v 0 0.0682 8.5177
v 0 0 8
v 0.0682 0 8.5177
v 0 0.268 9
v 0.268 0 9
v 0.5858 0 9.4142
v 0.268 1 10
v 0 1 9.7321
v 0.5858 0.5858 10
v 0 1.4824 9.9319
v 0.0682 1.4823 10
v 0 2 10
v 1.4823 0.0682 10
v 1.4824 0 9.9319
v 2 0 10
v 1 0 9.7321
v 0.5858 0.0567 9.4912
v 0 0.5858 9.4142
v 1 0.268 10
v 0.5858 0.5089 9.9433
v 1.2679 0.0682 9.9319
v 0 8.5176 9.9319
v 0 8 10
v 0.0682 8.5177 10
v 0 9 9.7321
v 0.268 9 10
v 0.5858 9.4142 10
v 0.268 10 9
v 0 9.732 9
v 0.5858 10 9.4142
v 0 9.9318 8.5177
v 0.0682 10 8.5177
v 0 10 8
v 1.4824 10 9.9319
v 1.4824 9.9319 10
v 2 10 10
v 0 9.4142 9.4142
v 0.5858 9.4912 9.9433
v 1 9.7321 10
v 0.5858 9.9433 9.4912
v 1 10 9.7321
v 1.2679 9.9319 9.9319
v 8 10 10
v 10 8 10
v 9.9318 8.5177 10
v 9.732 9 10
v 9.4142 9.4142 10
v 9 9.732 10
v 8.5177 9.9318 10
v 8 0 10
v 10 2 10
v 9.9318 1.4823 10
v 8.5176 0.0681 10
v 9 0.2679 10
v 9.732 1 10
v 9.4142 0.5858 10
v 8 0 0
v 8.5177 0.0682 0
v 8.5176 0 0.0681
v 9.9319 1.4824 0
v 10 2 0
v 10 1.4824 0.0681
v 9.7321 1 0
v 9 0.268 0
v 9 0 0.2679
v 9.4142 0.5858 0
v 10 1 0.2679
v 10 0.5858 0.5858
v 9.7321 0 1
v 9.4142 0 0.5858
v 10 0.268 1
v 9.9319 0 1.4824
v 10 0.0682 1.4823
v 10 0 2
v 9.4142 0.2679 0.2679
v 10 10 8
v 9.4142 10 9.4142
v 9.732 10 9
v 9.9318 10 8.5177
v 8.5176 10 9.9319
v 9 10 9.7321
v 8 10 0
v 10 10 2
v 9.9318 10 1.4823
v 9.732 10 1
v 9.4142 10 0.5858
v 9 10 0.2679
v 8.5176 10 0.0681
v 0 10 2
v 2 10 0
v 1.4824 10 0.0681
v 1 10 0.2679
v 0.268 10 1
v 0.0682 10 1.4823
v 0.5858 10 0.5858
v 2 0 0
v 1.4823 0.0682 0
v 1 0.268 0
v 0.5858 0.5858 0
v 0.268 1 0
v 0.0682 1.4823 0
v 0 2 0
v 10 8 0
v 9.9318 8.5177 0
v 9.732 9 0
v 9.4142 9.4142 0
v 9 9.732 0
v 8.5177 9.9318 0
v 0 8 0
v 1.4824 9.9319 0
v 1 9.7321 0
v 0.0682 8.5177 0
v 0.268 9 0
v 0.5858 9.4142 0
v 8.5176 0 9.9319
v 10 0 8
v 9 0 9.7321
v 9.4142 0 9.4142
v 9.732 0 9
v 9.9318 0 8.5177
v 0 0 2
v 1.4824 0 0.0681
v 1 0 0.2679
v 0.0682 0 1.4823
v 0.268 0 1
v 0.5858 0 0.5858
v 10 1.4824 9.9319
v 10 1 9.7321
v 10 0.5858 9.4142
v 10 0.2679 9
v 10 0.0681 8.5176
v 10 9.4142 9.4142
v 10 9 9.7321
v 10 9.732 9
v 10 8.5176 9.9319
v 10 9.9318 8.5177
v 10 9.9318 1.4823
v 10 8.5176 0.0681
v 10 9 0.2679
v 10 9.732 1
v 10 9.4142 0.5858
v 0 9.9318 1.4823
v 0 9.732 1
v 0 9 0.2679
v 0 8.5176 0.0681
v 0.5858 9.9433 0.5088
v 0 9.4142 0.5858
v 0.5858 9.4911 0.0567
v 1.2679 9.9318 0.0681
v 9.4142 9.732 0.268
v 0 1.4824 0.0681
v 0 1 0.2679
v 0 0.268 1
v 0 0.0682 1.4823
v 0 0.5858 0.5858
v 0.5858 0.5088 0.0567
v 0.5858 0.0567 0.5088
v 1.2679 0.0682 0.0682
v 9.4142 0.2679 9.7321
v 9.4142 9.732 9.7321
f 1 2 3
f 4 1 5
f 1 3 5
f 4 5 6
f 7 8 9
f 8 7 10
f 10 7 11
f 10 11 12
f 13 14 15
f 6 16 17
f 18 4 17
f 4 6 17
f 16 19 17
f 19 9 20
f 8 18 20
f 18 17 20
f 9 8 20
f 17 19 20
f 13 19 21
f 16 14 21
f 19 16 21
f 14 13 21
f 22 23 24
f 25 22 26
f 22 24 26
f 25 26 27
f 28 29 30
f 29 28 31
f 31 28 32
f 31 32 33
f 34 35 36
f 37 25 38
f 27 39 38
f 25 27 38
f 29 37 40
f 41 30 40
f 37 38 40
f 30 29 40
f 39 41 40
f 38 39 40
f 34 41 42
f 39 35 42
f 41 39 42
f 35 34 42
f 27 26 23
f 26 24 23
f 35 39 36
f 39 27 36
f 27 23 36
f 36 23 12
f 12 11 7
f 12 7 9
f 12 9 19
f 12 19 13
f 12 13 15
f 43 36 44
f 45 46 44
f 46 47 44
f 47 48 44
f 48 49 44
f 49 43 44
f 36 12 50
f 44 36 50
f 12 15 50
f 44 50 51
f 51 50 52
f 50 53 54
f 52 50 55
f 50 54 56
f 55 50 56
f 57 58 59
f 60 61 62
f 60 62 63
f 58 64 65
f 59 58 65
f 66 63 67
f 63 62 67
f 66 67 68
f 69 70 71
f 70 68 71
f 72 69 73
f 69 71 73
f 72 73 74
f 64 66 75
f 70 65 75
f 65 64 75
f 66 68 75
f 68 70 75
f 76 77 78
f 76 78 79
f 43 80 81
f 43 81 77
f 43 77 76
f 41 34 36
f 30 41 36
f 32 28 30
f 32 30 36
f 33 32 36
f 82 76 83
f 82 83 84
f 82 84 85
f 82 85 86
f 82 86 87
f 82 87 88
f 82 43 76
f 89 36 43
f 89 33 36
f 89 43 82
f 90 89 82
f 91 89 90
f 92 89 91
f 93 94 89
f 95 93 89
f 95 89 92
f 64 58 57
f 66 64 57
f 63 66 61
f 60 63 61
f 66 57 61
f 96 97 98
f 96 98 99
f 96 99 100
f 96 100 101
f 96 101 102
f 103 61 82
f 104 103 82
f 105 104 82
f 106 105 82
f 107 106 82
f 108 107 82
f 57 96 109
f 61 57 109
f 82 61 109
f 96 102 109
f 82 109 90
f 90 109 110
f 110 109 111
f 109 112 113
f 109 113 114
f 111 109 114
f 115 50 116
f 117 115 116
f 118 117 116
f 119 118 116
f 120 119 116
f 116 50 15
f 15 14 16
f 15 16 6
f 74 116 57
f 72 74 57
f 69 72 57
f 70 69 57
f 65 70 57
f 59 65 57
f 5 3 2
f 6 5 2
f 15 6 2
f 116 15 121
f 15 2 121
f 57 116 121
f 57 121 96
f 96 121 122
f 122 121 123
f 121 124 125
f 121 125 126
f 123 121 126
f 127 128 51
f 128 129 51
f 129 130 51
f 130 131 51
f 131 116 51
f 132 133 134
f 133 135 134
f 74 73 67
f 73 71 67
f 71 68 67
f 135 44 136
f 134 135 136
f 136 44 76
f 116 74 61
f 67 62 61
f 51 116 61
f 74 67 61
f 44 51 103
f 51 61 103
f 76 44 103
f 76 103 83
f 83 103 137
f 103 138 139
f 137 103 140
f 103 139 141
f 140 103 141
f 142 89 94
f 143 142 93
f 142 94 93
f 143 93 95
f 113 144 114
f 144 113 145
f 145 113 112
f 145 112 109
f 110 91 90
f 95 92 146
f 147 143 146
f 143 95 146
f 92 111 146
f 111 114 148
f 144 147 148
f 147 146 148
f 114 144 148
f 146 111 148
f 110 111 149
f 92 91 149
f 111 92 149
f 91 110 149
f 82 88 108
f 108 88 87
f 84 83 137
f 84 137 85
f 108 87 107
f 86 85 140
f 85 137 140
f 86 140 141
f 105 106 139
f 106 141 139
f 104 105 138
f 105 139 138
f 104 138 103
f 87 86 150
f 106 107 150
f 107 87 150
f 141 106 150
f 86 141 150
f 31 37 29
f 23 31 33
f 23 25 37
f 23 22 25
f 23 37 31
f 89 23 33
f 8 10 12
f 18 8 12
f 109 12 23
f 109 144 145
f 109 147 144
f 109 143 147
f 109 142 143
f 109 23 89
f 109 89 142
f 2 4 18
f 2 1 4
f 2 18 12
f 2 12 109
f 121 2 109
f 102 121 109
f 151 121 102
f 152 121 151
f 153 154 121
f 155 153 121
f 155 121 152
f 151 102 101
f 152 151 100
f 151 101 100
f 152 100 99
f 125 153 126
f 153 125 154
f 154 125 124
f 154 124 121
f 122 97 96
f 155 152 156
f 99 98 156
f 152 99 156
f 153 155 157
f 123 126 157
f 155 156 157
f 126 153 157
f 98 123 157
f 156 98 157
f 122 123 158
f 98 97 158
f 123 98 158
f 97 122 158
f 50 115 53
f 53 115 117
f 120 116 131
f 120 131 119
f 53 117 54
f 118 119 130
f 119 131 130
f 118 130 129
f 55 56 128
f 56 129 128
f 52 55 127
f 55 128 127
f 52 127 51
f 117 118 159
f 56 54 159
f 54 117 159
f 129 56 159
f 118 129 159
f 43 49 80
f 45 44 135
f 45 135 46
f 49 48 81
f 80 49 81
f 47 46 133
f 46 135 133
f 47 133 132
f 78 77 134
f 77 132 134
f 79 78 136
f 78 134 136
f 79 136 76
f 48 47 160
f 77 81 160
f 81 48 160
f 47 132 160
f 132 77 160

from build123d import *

# Parameters (mm, degrees)
PADR_O_LINEAR2_COUNT       = 2
PADR_O_LINEAR2_PITCH       = 6
PADR_O_LINEAR2_2_COUNT     = 2
PADR_O_LINEAR2_2_PITCH     = 6
CORTE_EXTRUS_O1_DEPTH      = 19.755385946
CORTE_EXTRUS_O1_DEPTH_BACK = 19.755385946
ESBO_O3_W                  = 20
ESBO_O3_H                  = 20
ESBO_O3_W_2                = 2
ESBO_O3_H_2                = 2
CORTE_EXTRUS_O3_DEPTH      = 20
CORTE_EXTRUS_O3_DEPTH_BACK = 10
ESBO_O4_W                  = 20
ESBO_O4_H                  = 20
ESBO_O4_W_2                = 2
ESBO_O4_H_2                = 2
ESBO_O5_W                  = 10
ESBO_O5_H                  = 10
RESSALTO_EXTRUS_O1_DEPTH   = 6
ESBO_O6_W                  = 10
ESBO_O6_H                  = 10
RESSALTO_EXTRUS_O2_DEPTH   = 6
ESBO_O7_W                  = 10
ESBO_O7_H                  = 10
RESSALTO_EXTRUS_O3_DEPTH   = 6


with BuildPart() as part:
    # Esboço2 → Revolução1 (revolve)
    with BuildSketch(Plane.XY.offset(2)):
        with BuildLine():
            Line((2, 2), (-0.828427125, 2))
            ThreePointArc((-0.828427125, 2), (2, -0.828427125), (4.828427125, 2))
            Line((4.828427125, 2), (2, 2))
        make_face()
        with BuildLine():
            Line((8, 2), (5.171572875, 2))
            ThreePointArc((5.171572875, 2), (8, -0.828427125), (10.828427125, 2))
            Line((10.828427125, 2), (8, 2))
        make_face()
    revolve(axis=Axis((2, 2, 2), (-1, 0, 0)))


with BuildPart() as padr_o_linear2_1:
    # Padrão linear2: pattern copy
    add(part.part.moved(Location(Vector(0, 0, 1) * (1 * PADR_O_LINEAR2_PITCH))))


with BuildPart() as padr_o_linear2_2_1:
    # Padr_o linear2 2: pattern copy
    add(part.part.moved(Location(Vector(0, 1, 0) * (1 * PADR_O_LINEAR2_2_PITCH))))


with BuildPart() as padr_o_linear2_2_2:
    # Padr_o linear2 2: pattern copy
    add(padr_o_linear2_1.part.moved(Location(Vector(0, 1, 0) * (1 * PADR_O_LINEAR2_2_PITCH))))


with BuildPart() as corte_extrus_o1_tool:
    # Esboço3 → Corte-extrusão1 (new, two sides: drawn at the far end of the back side and taken through both)
    with BuildSketch(Plane.XY.offset(-CORTE_EXTRUS_O1_DEPTH_BACK)):
        with Locations((5, 5)):
            Rectangle(ESBO_O3_W, ESBO_O3_H)
        with Locations((1, 9)):
            Rectangle(ESBO_O3_W_2, ESBO_O3_H_2, mode=Mode.SUBTRACT)
        with Locations((1, 1)):
            Rectangle(ESBO_O3_W_2, ESBO_O3_H_2, mode=Mode.SUBTRACT)
        with Locations((9, 1)):
            Rectangle(ESBO_O3_W_2, ESBO_O3_H_2, mode=Mode.SUBTRACT)
        with Locations((9, 9)):
            Rectangle(ESBO_O3_W_2, ESBO_O3_H_2, mode=Mode.SUBTRACT)
    extrude(amount=CORTE_EXTRUS_O1_DEPTH + CORTE_EXTRUS_O1_DEPTH_BACK)


with BuildPart() as part_1:
    add(part.part)

    # Corte-extrusão1: cut by corte_extrus_o1_tool
    add(corte_extrus_o1_tool.part, mode=Mode.SUBTRACT)


with BuildPart() as padr_o_linear2_1_1:
    add(padr_o_linear2_1.part)

    # Corte-extrusão1: cut by corte_extrus_o1_tool
    add(corte_extrus_o1_tool.part, mode=Mode.SUBTRACT)


with BuildPart() as padr_o_linear2_2_1_1:
    add(padr_o_linear2_2_1.part)

    # Corte-extrusão1: cut by corte_extrus_o1_tool
    add(corte_extrus_o1_tool.part, mode=Mode.SUBTRACT)


with BuildPart() as padr_o_linear2_2_2_1:
    add(padr_o_linear2_2_2.part)

    # Corte-extrusão1: cut by corte_extrus_o1_tool
    add(corte_extrus_o1_tool.part, mode=Mode.SUBTRACT)


with BuildPart() as corte_extrus_o3_tool:
    # Esboço4 → Corte-extrusão3 (new, two sides: drawn at the far end of the back side and taken through both)
    with BuildSketch(Plane(origin=(0, 0, 0), x_dir=(0, 0, -1), z_dir=(1, 0, 0)).offset(-CORTE_EXTRUS_O3_DEPTH_BACK)):
        with Locations((-5, 5)):
            Rectangle(ESBO_O4_W, ESBO_O4_H)
        with Locations((-9, 9)):
            Rectangle(ESBO_O4_W_2, ESBO_O4_H_2, mode=Mode.SUBTRACT)
        with Locations((-1, 1)):
            Rectangle(ESBO_O4_W_2, ESBO_O4_H_2, mode=Mode.SUBTRACT)
        with Locations((-1, 9)):
            Rectangle(ESBO_O4_W_2, ESBO_O4_H_2, mode=Mode.SUBTRACT)
        with Locations((-9, 1)):
            Rectangle(ESBO_O4_W_2, ESBO_O4_H_2, mode=Mode.SUBTRACT)
    extrude(amount=CORTE_EXTRUS_O3_DEPTH + CORTE_EXTRUS_O3_DEPTH_BACK)


with BuildPart() as part_2:
    add(part_1.part)

    # Corte-extrusão3: cut by corte_extrus_o3_tool
    add(corte_extrus_o3_tool.part, mode=Mode.SUBTRACT)



with BuildPart() as padr_o_linear2_1_2:
    add(padr_o_linear2_1_1.part)

    # Corte-extrusão3: cut by corte_extrus_o3_tool
    add(corte_extrus_o3_tool.part, mode=Mode.SUBTRACT)


with BuildPart() as padr_o_linear2_2_1_2:
    add(padr_o_linear2_2_1_1.part)

    # Corte-extrusão3: cut by corte_extrus_o3_tool
    add(corte_extrus_o3_tool.part, mode=Mode.SUBTRACT)


with BuildPart() as padr_o_linear2_2_2_2:
    add(padr_o_linear2_2_2_1.part)

    # Corte-extrusão3: cut by corte_extrus_o3_tool
    add(corte_extrus_o3_tool.part, mode=Mode.SUBTRACT)


with BuildPart() as part_3:
    add(part_2.part)

    add(padr_o_linear2_1_2.part)  # Ressalto-extrusão1 merges Padrão linear2_1

    add(padr_o_linear2_2_1_2.part)  # Ressalto-extrusão1 merges Padrão linear2 2_1

    add(padr_o_linear2_2_2_2.part)  # Ressalto-extrusão1 merges Padrão linear2 2_2
    # Esboço5 → Ressalto-extrusão1 (add)
    with BuildSketch(Plane.XY.offset(2)):
        with Locations((5, 5)):
            Rectangle(ESBO_O5_W, ESBO_O5_H)
    extrude(amount=RESSALTO_EXTRUS_O1_DEPTH)

    # Esboço6 → Ressalto-extrusão2 (add)
    with BuildSketch(Plane(origin=(2, 0, 0), x_dir=(0, 0, -1), z_dir=(1, 0, 0))):
        with Locations((-5, 5)):
            Rectangle(ESBO_O6_W, ESBO_O6_H)
    extrude(amount=RESSALTO_EXTRUS_O2_DEPTH)

    # Esboço7 → Ressalto-extrusão3 (add)
    with BuildSketch(Plane(origin=(0, 2, 0), x_dir=(1, 0, 0), z_dir=(0, 1, 0))):
        with Locations((5, -5)):
            Rectangle(ESBO_O7_W, ESBO_O7_H)
    extrude(amount=RESSALTO_EXTRUS_O3_DEPTH)


solid = part_3.part
